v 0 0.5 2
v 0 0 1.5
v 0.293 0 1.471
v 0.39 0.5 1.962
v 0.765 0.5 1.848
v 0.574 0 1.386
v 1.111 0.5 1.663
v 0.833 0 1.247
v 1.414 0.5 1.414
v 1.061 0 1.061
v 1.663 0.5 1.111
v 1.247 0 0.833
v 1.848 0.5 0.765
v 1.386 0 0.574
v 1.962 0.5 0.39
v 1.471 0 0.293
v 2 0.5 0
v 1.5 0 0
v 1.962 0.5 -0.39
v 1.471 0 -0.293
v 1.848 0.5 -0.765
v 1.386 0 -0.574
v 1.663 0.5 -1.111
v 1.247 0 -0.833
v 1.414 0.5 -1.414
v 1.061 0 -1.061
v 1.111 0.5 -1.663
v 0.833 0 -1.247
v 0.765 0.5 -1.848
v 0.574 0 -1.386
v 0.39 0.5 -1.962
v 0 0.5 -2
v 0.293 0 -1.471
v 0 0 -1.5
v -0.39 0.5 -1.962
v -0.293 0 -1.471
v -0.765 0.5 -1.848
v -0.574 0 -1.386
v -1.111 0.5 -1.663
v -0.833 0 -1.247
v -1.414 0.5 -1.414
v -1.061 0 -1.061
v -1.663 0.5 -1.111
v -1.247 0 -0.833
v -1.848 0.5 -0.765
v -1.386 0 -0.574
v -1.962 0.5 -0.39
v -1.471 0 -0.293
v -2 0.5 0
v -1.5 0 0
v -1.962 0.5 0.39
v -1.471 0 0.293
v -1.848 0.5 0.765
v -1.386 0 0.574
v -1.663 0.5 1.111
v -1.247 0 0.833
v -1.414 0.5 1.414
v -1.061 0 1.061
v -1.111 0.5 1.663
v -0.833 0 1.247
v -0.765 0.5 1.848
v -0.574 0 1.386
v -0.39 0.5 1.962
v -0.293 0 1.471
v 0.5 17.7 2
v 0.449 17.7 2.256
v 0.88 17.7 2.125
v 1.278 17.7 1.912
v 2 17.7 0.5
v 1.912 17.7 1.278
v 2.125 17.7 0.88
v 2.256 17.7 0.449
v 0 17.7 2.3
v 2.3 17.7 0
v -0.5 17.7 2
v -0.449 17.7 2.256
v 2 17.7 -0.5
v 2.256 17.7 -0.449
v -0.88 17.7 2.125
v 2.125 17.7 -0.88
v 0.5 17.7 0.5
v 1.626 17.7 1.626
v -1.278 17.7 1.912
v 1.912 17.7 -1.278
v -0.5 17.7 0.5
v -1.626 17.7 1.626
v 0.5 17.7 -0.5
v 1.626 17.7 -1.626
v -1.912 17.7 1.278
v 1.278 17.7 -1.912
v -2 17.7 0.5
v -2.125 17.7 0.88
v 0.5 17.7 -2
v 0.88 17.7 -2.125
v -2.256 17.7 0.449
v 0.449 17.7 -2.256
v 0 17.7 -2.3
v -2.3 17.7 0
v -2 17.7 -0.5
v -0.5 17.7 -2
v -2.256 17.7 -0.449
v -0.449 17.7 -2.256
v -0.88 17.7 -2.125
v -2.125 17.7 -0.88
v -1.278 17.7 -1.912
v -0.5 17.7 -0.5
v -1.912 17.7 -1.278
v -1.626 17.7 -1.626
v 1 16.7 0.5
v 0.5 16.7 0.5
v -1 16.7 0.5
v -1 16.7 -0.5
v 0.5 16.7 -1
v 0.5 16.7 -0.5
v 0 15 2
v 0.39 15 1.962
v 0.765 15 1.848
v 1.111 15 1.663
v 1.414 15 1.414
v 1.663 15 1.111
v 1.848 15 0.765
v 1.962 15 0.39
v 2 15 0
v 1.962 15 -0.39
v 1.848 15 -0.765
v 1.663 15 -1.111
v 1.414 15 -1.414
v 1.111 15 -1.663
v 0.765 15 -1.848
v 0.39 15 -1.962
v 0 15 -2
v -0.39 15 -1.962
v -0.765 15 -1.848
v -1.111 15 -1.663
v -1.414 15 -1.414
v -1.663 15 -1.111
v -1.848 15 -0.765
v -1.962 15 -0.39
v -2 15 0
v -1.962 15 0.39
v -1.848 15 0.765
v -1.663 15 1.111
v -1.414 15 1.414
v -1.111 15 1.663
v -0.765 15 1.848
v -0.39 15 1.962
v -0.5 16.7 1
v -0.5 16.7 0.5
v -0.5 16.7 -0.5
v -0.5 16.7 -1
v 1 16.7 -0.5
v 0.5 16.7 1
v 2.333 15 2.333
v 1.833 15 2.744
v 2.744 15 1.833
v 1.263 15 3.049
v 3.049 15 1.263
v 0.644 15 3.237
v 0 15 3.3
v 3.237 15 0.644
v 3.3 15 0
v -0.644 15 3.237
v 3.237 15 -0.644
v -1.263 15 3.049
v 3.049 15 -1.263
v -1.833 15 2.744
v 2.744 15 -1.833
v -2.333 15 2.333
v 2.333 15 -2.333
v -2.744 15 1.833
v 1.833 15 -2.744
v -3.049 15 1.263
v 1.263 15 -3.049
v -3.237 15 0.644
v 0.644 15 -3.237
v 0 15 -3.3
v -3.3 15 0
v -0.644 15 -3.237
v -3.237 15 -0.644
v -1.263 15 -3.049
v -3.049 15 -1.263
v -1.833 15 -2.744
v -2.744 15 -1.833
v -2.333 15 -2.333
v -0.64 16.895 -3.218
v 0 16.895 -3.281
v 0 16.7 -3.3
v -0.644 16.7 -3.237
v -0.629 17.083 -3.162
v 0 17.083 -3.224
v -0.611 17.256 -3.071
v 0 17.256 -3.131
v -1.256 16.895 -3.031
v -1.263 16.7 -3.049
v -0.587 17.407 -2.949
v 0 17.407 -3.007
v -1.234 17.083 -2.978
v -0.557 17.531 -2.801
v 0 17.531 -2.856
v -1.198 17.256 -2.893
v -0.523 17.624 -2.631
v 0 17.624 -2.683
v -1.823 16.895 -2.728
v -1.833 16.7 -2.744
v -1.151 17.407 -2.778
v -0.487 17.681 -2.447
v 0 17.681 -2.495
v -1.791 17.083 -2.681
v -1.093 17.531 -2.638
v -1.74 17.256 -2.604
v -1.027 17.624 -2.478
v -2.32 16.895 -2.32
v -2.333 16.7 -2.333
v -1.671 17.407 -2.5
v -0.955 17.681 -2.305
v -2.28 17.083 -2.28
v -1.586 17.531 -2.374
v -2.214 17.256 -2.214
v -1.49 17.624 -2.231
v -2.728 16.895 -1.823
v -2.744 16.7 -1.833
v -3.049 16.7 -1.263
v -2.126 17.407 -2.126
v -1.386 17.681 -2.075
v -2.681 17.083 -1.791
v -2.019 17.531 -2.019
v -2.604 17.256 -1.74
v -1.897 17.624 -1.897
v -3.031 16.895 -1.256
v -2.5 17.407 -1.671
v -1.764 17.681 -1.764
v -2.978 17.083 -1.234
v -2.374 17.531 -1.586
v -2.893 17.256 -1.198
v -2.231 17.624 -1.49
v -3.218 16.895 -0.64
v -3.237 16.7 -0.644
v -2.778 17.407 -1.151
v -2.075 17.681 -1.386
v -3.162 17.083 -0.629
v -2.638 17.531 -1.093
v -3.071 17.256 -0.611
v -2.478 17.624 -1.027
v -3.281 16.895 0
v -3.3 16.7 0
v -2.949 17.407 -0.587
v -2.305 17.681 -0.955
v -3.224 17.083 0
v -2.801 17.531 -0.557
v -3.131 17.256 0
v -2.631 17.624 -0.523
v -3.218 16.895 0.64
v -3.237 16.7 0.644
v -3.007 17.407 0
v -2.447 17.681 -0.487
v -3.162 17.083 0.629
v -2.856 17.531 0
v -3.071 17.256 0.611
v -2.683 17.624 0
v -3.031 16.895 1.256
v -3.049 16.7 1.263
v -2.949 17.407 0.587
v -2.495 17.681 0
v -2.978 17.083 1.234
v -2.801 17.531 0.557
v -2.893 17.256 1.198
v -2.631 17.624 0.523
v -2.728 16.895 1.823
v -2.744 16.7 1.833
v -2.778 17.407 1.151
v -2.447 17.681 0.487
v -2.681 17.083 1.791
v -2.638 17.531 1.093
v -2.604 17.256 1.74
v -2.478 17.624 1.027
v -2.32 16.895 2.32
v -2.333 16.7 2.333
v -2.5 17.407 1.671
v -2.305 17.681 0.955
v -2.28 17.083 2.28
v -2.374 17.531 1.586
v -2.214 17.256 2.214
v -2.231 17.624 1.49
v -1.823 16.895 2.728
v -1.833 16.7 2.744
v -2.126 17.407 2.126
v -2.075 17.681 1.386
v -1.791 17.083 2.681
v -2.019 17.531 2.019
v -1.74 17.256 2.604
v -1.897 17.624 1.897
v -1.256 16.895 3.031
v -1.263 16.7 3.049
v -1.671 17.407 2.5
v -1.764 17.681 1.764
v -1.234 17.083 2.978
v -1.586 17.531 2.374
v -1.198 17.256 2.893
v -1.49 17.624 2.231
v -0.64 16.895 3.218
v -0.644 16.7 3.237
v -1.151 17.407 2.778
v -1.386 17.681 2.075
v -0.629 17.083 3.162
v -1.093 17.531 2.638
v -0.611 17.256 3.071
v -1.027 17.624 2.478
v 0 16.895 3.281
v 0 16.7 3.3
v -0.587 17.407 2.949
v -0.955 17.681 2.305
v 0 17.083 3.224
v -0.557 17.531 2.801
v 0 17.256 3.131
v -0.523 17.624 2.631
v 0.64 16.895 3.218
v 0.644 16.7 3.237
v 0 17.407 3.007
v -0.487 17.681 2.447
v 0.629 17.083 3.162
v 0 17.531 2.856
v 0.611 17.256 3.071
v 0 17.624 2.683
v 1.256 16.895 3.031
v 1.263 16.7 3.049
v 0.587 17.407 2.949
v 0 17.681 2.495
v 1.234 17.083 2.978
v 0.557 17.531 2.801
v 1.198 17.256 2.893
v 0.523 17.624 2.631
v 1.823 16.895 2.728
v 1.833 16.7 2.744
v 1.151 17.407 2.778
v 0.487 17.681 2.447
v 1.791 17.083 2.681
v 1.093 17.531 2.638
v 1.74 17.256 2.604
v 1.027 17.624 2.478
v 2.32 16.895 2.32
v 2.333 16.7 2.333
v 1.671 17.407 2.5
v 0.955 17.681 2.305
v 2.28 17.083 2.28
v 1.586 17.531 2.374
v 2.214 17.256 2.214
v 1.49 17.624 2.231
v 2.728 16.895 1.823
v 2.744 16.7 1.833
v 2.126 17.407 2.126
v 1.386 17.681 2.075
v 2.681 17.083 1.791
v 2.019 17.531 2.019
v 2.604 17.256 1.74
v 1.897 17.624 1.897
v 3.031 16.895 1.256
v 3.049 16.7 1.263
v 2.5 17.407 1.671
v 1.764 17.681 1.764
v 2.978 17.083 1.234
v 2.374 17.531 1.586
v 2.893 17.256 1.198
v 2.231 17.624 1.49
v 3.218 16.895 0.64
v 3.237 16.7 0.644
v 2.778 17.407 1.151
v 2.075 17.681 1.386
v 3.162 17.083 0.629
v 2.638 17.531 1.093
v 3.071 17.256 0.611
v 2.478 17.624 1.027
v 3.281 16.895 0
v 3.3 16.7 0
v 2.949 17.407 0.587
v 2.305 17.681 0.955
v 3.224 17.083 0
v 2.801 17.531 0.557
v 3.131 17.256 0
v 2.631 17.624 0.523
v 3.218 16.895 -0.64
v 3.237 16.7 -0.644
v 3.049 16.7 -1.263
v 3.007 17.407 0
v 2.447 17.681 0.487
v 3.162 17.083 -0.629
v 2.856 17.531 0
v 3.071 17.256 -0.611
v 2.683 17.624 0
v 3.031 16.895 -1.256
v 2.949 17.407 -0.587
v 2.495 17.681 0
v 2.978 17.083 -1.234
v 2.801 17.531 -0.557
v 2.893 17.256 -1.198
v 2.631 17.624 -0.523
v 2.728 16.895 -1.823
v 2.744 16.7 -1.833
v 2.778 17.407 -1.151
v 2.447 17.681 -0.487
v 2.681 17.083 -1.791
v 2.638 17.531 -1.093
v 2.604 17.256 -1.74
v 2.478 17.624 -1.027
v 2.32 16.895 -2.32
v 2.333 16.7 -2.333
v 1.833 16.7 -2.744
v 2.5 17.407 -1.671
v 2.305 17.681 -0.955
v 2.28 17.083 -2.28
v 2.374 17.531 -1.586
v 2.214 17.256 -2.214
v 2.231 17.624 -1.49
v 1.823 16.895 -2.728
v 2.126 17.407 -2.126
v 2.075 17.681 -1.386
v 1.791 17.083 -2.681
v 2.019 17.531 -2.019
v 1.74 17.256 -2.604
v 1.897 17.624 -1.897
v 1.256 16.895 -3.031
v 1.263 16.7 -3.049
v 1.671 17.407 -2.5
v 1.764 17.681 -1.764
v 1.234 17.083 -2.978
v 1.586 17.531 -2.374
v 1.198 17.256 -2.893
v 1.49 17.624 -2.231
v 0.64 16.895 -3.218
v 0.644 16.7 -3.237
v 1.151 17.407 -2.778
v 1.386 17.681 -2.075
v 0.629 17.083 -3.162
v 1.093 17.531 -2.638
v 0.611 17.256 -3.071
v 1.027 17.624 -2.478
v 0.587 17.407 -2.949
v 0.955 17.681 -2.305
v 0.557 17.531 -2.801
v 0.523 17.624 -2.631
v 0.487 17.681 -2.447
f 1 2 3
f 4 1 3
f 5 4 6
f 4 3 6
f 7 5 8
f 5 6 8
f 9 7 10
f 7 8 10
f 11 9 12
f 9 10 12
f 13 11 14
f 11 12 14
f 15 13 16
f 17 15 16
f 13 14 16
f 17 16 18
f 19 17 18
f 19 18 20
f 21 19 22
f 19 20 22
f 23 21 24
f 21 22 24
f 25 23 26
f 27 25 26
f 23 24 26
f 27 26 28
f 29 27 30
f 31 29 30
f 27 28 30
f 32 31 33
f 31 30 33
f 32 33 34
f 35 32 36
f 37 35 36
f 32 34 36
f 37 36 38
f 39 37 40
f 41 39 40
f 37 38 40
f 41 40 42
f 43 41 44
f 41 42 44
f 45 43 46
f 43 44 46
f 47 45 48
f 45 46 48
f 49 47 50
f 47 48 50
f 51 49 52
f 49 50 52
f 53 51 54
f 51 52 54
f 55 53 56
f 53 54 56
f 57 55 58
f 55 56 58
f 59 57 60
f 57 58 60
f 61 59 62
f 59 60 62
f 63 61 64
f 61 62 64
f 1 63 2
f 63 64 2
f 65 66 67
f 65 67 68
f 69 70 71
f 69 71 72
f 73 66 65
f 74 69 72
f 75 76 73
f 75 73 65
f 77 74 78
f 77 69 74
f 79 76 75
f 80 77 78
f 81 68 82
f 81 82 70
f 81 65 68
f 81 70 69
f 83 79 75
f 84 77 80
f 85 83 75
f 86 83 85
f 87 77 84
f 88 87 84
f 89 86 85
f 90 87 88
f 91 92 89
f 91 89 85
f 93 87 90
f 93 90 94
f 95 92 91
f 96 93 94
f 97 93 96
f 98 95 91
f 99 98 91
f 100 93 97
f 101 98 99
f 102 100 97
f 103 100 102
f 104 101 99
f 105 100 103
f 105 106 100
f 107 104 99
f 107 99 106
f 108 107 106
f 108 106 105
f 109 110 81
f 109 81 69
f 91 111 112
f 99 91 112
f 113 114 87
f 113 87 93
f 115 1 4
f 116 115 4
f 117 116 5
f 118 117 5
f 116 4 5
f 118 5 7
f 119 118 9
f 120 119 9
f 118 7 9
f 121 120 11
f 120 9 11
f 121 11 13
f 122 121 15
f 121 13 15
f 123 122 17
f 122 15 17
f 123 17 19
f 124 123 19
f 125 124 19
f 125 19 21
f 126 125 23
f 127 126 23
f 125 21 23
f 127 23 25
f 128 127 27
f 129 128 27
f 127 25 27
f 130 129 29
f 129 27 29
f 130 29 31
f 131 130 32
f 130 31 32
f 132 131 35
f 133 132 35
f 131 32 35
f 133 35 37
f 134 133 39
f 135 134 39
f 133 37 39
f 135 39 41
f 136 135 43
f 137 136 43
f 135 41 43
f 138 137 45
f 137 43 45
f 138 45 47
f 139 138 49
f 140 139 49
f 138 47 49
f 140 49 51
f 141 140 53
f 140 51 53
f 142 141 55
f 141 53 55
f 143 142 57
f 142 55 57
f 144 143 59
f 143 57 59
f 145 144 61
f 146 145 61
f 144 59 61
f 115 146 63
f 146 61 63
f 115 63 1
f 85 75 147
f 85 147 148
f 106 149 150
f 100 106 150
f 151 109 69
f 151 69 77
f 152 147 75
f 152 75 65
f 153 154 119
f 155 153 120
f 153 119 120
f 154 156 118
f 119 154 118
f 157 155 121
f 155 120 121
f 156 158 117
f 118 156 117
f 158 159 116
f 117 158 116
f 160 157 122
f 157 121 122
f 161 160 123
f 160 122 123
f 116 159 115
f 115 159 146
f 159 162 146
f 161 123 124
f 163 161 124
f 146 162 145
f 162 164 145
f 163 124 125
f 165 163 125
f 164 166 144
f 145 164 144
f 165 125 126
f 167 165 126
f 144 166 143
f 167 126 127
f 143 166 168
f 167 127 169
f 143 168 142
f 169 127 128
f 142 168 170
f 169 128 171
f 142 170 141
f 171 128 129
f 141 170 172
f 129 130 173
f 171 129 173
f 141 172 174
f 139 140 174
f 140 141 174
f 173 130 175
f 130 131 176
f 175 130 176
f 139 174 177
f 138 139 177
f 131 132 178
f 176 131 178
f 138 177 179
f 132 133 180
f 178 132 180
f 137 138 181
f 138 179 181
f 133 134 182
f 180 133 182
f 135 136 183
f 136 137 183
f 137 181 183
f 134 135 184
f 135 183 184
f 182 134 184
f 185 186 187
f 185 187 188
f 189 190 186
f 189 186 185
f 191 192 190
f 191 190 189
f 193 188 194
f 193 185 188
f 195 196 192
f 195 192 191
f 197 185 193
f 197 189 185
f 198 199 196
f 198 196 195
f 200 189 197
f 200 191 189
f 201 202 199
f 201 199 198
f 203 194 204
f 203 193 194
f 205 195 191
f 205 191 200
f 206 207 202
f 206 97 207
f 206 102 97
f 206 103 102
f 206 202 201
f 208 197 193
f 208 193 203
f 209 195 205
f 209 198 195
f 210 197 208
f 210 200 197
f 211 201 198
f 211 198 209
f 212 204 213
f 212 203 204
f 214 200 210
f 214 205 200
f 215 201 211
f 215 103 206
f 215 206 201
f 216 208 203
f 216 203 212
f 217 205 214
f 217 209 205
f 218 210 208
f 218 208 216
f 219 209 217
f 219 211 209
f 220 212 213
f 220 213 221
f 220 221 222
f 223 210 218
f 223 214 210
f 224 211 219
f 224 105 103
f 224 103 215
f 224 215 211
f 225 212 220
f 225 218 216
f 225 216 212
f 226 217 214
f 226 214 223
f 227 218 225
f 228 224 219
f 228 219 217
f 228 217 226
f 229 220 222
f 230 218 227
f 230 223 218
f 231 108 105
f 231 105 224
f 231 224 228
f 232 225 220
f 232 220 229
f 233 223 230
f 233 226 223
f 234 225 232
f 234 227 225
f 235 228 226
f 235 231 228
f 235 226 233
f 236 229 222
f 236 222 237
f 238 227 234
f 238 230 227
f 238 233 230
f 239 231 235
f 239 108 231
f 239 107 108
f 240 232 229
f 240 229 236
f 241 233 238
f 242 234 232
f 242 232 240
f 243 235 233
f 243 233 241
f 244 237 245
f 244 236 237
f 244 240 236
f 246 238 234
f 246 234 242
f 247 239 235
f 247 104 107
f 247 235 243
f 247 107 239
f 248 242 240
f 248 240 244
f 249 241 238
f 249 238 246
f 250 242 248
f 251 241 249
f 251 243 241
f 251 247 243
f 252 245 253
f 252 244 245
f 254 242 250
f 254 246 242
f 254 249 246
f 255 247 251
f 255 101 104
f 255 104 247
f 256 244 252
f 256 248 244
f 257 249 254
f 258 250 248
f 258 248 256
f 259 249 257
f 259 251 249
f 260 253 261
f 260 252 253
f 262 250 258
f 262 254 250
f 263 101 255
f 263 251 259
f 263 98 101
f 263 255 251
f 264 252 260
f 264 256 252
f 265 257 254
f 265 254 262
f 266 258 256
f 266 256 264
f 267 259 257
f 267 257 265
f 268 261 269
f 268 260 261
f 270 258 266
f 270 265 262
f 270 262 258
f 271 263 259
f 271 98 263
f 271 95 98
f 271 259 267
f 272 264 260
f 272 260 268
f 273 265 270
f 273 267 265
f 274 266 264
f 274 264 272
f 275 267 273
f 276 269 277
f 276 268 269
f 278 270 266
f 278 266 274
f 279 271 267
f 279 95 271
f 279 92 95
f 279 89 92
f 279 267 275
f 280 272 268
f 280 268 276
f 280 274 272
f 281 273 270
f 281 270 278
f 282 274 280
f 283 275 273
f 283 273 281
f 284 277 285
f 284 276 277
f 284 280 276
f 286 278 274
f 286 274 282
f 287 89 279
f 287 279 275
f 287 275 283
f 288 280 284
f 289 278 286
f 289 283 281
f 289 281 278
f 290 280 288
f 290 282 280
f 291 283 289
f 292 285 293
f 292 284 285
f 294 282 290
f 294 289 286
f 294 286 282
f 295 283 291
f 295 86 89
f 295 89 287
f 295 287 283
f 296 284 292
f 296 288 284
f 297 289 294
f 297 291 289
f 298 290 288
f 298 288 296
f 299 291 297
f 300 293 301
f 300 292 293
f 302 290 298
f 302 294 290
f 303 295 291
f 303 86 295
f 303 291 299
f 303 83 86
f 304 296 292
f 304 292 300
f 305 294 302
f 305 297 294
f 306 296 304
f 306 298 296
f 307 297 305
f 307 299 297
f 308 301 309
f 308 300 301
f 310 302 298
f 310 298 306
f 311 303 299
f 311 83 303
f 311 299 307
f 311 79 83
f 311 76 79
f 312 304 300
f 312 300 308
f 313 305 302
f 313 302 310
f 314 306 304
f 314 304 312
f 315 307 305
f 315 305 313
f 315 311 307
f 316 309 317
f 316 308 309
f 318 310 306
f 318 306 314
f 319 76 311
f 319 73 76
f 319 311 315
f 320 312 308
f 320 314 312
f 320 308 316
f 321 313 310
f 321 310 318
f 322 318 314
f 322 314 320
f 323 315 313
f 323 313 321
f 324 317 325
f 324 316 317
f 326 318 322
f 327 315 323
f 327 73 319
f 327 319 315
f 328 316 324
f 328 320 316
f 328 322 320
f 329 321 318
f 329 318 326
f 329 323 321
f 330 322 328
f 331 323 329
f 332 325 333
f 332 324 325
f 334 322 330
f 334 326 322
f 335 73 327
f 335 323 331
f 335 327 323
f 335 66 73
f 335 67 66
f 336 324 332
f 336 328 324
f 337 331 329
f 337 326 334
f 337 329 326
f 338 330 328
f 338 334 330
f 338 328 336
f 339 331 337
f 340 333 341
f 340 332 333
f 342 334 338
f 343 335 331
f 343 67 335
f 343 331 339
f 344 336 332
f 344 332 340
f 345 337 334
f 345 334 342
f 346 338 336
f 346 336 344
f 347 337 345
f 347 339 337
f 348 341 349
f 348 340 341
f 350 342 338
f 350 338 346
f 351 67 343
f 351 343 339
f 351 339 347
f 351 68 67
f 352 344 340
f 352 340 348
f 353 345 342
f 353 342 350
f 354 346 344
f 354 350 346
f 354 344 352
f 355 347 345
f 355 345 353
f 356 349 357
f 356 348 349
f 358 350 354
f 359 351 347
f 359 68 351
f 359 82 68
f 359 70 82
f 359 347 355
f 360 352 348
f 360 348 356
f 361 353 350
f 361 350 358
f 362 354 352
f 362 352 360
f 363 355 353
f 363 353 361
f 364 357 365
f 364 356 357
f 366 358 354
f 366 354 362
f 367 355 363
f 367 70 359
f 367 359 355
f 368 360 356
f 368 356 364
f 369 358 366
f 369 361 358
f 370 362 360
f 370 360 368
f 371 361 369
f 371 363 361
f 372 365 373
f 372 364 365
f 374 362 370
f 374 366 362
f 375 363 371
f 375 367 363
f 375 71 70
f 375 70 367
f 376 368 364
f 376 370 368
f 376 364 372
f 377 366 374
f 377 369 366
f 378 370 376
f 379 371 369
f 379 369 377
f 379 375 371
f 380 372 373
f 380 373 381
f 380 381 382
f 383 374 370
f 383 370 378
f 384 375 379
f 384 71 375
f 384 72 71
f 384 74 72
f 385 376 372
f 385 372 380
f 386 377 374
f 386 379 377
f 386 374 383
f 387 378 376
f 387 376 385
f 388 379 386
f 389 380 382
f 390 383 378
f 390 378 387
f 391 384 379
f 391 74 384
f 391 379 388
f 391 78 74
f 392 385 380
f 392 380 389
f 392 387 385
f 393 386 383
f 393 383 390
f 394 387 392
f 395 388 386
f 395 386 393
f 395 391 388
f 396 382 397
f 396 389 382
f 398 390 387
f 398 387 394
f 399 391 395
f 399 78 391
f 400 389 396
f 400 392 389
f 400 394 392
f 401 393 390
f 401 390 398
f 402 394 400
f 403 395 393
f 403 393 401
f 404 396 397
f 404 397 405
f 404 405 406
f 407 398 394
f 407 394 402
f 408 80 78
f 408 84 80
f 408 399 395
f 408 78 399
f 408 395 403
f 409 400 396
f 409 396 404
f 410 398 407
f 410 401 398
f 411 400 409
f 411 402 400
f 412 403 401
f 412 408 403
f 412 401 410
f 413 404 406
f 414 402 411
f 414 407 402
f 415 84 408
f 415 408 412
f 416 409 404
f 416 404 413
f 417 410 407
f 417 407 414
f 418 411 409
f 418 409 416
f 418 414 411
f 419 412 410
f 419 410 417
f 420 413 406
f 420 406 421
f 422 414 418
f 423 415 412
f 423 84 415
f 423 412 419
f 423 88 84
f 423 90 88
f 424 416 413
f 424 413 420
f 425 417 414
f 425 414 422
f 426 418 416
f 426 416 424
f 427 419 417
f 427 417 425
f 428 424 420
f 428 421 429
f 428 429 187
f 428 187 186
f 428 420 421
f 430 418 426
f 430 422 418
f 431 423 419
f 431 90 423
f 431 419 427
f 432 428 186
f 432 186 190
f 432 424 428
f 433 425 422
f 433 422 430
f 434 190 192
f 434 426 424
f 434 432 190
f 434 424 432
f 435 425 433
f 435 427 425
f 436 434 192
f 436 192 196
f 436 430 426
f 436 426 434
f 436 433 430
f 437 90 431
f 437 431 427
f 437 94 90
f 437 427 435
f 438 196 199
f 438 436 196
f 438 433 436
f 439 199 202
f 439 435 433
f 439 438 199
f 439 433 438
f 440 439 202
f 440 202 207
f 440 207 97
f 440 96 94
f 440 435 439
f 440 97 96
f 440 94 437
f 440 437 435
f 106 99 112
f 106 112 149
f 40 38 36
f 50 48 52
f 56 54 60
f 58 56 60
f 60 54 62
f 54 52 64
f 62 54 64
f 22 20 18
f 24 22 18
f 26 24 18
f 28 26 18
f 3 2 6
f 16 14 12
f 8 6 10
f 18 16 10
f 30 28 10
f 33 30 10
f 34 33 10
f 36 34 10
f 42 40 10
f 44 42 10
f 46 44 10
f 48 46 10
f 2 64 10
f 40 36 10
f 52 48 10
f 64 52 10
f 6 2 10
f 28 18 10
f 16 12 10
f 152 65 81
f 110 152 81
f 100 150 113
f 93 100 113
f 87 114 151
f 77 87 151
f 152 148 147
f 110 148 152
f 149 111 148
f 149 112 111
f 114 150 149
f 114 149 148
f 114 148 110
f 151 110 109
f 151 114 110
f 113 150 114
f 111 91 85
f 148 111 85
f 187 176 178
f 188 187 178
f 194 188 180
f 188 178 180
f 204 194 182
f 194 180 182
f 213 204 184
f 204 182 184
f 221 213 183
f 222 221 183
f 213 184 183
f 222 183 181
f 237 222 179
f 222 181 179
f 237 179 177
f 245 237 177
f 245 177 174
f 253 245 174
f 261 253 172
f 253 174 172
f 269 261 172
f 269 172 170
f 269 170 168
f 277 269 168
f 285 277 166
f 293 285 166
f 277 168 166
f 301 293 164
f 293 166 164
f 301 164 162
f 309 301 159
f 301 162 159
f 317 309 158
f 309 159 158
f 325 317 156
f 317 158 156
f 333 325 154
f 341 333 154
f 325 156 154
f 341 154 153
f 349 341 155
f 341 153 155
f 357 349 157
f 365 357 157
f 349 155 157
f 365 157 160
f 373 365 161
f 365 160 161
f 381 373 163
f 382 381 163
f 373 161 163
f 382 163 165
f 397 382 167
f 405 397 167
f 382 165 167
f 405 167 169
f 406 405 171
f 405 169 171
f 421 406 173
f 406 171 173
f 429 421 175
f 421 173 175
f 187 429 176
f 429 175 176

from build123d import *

# Parameters (mm, degrees)
SKETCH_1_R          = 2
EXTRUDE_1_DEPTH     = 15
SKETCH_2_R          = 3.3
EXTRUDE_2_DEPTH     = 2.7
FILLET_1_R          = 1
CHAMFER_1_SIZE      = 0.5
SKETCH_3_W          = 4
SKETCH_3_H          = 1
SKETCH_3_W_2        = 1
SKETCH_3_H_2        = 4
CUT_EXTRUDE_1_DEPTH = 1
CHAMFER_2_SIZE      = 1


with BuildPart() as part:
    # 草图1 → 凸台-拉伸1 (new body)
    with BuildSketch(Plane(origin=(0, 0, 0), x_dir=(1, 0, 0), z_dir=(0, 1, 0))):
        with Locations(Location((0, 0, 0), (0, 0, 270))):
            Circle(SKETCH_1_R)
    extrude(amount=EXTRUDE_1_DEPTH)

    # 草图2 → 凸台-拉伸2 (add)
    with BuildSketch(Plane(origin=(0, 15, 0), x_dir=(1, 0, 0), z_dir=(0, 1, 0))):
        with Locations(Location((0, 0, 0), (0, 0, 90))):
            Circle(SKETCH_2_R)
    extrude(amount=EXTRUDE_2_DEPTH)

    # 圆角1
    fillet_1_edges = [part.edges().sort_by_distance(p)[0] for p in [
        (0, 17.7, 3.3),
    ]]
    fillet(fillet_1_edges, radius=FILLET_1_R)

    # 倒角1
    chamfer_1_edges = [part.edges().sort_by_distance(p)[0] for p in [
        (0, 0, -2),
    ]]
    chamfer(chamfer_1_edges, length=CHAMFER_1_SIZE)

    # 草图3 → 切除-拉伸-薄壁1 (cut)
    with BuildSketch(Plane(origin=(0, 17.7, 0), x_dir=(1, 0, 0), z_dir=(0, 1, 0))):
        Rectangle(SKETCH_3_W, SKETCH_3_H)
        Rectangle(SKETCH_3_W_2, SKETCH_3_H_2)
    extrude(amount=-CUT_EXTRUDE_1_DEPTH, mode=Mode.SUBTRACT)

    # 倒角2
    chamfer_2_edges = [part.edges().sort_by_distance(p)[0] for p in [
        (0, 16.7, 2),
        (2, 16.7, 0),
        (0, 16.7, -2),
        (-2, 16.7, 0),
    ]]
    chamfer(chamfer_2_edges, length=CHAMFER_2_SIZE - 0.0001)  # a hair under: the kernel refuses the full size


solid = part.part
